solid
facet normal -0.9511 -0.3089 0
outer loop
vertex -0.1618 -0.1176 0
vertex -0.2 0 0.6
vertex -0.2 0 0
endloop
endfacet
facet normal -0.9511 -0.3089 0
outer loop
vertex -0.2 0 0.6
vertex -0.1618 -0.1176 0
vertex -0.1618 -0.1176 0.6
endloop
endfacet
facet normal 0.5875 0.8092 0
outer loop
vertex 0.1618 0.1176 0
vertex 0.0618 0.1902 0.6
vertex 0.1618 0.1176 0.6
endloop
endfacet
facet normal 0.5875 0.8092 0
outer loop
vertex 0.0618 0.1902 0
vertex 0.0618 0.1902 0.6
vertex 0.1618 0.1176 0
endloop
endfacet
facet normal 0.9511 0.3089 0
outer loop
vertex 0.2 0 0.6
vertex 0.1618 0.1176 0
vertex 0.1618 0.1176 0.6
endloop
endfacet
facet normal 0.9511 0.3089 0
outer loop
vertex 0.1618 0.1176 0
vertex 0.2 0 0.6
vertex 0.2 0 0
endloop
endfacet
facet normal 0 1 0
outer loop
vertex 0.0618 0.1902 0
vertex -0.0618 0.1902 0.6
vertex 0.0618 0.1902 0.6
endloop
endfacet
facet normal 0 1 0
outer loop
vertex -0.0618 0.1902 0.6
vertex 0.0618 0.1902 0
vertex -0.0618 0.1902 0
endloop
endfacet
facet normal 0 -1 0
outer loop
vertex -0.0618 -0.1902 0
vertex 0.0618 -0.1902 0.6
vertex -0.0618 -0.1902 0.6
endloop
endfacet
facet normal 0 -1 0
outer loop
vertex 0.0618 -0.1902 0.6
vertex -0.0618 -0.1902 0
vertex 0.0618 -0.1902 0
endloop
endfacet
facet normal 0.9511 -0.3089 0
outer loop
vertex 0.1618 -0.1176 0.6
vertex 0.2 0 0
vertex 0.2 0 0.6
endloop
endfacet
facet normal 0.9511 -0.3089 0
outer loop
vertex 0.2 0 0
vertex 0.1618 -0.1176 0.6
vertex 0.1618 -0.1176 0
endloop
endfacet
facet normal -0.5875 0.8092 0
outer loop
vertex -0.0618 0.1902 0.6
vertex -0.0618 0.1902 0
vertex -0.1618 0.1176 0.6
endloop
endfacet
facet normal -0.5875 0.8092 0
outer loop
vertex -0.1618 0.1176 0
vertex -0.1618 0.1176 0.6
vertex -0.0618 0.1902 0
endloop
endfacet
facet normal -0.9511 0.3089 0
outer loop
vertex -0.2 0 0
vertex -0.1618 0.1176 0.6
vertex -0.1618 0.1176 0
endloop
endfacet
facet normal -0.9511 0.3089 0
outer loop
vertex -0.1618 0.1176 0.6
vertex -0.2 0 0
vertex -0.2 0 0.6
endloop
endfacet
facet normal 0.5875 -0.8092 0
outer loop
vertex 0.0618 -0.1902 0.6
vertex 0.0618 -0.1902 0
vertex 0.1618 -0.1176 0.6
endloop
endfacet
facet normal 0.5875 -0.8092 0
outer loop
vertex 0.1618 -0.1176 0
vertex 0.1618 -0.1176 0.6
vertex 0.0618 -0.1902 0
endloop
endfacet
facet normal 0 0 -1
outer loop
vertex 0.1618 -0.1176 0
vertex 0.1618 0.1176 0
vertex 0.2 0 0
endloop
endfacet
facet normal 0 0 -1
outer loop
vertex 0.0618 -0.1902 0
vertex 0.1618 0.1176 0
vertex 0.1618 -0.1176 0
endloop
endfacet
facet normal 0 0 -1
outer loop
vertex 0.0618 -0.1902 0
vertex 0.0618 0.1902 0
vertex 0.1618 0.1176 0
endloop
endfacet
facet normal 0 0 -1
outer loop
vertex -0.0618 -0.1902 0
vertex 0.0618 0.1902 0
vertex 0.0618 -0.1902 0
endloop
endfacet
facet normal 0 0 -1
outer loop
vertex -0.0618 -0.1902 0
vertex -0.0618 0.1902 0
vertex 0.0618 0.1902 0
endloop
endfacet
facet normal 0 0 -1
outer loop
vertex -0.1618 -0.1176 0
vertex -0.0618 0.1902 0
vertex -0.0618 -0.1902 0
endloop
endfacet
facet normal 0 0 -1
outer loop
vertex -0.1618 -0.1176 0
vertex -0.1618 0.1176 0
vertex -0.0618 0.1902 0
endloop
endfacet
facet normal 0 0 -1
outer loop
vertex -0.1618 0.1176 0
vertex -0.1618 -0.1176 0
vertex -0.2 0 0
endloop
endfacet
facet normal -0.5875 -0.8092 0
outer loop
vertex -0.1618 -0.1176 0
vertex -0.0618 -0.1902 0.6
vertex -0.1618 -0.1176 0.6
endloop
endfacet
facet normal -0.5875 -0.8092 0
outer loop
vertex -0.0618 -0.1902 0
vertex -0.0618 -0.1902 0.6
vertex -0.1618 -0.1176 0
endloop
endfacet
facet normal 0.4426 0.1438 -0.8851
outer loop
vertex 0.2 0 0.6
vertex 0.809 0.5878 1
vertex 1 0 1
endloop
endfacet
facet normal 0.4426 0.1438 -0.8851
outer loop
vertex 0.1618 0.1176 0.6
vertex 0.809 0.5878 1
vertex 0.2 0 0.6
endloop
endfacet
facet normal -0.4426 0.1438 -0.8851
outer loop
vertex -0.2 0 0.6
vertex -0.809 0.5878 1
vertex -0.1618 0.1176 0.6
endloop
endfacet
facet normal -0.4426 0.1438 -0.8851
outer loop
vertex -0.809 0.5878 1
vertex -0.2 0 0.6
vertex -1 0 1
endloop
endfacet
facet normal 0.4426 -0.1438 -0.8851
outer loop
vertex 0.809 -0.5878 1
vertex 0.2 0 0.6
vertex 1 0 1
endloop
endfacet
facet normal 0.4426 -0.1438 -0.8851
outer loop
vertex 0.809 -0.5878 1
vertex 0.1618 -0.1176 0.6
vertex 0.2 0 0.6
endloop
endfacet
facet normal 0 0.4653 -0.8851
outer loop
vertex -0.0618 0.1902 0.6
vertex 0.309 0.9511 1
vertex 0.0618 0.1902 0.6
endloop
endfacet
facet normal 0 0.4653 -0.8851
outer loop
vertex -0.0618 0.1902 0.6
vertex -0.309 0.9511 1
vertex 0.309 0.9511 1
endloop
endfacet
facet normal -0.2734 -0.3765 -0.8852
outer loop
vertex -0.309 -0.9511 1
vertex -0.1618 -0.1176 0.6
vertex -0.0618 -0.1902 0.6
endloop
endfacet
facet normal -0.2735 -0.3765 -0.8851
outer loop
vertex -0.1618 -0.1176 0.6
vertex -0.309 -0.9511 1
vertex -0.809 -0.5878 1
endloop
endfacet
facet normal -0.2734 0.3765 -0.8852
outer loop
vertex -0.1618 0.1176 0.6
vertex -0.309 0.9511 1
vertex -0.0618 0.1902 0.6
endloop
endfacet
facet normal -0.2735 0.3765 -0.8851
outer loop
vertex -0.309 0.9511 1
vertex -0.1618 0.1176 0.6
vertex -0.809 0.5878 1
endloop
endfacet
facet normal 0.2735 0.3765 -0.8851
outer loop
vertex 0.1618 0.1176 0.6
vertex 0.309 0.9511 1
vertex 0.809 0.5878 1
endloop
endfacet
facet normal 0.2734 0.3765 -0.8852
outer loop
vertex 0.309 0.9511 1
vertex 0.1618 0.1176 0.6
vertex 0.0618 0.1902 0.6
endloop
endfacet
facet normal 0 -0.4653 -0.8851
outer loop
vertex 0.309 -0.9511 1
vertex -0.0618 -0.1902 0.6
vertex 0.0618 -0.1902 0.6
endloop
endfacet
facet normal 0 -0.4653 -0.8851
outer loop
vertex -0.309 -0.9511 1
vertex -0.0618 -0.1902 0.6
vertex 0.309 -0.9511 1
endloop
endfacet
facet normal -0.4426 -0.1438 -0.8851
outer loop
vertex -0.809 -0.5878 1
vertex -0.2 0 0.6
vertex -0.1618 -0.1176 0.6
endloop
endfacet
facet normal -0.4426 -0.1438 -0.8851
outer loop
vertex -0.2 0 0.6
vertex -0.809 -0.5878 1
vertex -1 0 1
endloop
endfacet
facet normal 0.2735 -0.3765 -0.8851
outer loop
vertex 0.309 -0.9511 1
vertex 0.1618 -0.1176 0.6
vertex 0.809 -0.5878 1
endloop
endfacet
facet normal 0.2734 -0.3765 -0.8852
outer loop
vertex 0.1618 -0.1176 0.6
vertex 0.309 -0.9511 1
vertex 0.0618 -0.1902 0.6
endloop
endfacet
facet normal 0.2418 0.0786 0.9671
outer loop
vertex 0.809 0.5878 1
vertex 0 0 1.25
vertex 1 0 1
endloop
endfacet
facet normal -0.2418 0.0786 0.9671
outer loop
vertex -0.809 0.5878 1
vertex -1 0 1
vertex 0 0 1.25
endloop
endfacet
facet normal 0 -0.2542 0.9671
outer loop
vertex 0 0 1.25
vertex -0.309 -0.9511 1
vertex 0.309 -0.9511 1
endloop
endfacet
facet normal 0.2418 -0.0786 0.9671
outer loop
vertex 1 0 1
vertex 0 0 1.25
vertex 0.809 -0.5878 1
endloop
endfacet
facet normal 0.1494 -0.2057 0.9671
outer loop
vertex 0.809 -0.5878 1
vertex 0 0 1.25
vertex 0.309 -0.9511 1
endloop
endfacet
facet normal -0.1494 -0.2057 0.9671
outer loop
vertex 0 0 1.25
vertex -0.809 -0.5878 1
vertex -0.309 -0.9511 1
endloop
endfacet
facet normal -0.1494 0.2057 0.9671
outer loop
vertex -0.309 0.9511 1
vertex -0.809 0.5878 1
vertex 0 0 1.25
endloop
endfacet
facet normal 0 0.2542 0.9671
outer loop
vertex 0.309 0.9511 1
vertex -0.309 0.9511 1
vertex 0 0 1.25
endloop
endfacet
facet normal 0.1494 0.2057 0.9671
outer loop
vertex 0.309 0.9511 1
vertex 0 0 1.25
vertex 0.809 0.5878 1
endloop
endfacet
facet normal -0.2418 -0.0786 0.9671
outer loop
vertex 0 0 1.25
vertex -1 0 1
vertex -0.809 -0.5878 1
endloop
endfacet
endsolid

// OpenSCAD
$fn=10;

cylinder(1,0.2,0.2);
translate([0,0,0.5])
cylinder(0.5,0, 1);

translate([0,0,1])
cylinder(0.25,1, 0);
